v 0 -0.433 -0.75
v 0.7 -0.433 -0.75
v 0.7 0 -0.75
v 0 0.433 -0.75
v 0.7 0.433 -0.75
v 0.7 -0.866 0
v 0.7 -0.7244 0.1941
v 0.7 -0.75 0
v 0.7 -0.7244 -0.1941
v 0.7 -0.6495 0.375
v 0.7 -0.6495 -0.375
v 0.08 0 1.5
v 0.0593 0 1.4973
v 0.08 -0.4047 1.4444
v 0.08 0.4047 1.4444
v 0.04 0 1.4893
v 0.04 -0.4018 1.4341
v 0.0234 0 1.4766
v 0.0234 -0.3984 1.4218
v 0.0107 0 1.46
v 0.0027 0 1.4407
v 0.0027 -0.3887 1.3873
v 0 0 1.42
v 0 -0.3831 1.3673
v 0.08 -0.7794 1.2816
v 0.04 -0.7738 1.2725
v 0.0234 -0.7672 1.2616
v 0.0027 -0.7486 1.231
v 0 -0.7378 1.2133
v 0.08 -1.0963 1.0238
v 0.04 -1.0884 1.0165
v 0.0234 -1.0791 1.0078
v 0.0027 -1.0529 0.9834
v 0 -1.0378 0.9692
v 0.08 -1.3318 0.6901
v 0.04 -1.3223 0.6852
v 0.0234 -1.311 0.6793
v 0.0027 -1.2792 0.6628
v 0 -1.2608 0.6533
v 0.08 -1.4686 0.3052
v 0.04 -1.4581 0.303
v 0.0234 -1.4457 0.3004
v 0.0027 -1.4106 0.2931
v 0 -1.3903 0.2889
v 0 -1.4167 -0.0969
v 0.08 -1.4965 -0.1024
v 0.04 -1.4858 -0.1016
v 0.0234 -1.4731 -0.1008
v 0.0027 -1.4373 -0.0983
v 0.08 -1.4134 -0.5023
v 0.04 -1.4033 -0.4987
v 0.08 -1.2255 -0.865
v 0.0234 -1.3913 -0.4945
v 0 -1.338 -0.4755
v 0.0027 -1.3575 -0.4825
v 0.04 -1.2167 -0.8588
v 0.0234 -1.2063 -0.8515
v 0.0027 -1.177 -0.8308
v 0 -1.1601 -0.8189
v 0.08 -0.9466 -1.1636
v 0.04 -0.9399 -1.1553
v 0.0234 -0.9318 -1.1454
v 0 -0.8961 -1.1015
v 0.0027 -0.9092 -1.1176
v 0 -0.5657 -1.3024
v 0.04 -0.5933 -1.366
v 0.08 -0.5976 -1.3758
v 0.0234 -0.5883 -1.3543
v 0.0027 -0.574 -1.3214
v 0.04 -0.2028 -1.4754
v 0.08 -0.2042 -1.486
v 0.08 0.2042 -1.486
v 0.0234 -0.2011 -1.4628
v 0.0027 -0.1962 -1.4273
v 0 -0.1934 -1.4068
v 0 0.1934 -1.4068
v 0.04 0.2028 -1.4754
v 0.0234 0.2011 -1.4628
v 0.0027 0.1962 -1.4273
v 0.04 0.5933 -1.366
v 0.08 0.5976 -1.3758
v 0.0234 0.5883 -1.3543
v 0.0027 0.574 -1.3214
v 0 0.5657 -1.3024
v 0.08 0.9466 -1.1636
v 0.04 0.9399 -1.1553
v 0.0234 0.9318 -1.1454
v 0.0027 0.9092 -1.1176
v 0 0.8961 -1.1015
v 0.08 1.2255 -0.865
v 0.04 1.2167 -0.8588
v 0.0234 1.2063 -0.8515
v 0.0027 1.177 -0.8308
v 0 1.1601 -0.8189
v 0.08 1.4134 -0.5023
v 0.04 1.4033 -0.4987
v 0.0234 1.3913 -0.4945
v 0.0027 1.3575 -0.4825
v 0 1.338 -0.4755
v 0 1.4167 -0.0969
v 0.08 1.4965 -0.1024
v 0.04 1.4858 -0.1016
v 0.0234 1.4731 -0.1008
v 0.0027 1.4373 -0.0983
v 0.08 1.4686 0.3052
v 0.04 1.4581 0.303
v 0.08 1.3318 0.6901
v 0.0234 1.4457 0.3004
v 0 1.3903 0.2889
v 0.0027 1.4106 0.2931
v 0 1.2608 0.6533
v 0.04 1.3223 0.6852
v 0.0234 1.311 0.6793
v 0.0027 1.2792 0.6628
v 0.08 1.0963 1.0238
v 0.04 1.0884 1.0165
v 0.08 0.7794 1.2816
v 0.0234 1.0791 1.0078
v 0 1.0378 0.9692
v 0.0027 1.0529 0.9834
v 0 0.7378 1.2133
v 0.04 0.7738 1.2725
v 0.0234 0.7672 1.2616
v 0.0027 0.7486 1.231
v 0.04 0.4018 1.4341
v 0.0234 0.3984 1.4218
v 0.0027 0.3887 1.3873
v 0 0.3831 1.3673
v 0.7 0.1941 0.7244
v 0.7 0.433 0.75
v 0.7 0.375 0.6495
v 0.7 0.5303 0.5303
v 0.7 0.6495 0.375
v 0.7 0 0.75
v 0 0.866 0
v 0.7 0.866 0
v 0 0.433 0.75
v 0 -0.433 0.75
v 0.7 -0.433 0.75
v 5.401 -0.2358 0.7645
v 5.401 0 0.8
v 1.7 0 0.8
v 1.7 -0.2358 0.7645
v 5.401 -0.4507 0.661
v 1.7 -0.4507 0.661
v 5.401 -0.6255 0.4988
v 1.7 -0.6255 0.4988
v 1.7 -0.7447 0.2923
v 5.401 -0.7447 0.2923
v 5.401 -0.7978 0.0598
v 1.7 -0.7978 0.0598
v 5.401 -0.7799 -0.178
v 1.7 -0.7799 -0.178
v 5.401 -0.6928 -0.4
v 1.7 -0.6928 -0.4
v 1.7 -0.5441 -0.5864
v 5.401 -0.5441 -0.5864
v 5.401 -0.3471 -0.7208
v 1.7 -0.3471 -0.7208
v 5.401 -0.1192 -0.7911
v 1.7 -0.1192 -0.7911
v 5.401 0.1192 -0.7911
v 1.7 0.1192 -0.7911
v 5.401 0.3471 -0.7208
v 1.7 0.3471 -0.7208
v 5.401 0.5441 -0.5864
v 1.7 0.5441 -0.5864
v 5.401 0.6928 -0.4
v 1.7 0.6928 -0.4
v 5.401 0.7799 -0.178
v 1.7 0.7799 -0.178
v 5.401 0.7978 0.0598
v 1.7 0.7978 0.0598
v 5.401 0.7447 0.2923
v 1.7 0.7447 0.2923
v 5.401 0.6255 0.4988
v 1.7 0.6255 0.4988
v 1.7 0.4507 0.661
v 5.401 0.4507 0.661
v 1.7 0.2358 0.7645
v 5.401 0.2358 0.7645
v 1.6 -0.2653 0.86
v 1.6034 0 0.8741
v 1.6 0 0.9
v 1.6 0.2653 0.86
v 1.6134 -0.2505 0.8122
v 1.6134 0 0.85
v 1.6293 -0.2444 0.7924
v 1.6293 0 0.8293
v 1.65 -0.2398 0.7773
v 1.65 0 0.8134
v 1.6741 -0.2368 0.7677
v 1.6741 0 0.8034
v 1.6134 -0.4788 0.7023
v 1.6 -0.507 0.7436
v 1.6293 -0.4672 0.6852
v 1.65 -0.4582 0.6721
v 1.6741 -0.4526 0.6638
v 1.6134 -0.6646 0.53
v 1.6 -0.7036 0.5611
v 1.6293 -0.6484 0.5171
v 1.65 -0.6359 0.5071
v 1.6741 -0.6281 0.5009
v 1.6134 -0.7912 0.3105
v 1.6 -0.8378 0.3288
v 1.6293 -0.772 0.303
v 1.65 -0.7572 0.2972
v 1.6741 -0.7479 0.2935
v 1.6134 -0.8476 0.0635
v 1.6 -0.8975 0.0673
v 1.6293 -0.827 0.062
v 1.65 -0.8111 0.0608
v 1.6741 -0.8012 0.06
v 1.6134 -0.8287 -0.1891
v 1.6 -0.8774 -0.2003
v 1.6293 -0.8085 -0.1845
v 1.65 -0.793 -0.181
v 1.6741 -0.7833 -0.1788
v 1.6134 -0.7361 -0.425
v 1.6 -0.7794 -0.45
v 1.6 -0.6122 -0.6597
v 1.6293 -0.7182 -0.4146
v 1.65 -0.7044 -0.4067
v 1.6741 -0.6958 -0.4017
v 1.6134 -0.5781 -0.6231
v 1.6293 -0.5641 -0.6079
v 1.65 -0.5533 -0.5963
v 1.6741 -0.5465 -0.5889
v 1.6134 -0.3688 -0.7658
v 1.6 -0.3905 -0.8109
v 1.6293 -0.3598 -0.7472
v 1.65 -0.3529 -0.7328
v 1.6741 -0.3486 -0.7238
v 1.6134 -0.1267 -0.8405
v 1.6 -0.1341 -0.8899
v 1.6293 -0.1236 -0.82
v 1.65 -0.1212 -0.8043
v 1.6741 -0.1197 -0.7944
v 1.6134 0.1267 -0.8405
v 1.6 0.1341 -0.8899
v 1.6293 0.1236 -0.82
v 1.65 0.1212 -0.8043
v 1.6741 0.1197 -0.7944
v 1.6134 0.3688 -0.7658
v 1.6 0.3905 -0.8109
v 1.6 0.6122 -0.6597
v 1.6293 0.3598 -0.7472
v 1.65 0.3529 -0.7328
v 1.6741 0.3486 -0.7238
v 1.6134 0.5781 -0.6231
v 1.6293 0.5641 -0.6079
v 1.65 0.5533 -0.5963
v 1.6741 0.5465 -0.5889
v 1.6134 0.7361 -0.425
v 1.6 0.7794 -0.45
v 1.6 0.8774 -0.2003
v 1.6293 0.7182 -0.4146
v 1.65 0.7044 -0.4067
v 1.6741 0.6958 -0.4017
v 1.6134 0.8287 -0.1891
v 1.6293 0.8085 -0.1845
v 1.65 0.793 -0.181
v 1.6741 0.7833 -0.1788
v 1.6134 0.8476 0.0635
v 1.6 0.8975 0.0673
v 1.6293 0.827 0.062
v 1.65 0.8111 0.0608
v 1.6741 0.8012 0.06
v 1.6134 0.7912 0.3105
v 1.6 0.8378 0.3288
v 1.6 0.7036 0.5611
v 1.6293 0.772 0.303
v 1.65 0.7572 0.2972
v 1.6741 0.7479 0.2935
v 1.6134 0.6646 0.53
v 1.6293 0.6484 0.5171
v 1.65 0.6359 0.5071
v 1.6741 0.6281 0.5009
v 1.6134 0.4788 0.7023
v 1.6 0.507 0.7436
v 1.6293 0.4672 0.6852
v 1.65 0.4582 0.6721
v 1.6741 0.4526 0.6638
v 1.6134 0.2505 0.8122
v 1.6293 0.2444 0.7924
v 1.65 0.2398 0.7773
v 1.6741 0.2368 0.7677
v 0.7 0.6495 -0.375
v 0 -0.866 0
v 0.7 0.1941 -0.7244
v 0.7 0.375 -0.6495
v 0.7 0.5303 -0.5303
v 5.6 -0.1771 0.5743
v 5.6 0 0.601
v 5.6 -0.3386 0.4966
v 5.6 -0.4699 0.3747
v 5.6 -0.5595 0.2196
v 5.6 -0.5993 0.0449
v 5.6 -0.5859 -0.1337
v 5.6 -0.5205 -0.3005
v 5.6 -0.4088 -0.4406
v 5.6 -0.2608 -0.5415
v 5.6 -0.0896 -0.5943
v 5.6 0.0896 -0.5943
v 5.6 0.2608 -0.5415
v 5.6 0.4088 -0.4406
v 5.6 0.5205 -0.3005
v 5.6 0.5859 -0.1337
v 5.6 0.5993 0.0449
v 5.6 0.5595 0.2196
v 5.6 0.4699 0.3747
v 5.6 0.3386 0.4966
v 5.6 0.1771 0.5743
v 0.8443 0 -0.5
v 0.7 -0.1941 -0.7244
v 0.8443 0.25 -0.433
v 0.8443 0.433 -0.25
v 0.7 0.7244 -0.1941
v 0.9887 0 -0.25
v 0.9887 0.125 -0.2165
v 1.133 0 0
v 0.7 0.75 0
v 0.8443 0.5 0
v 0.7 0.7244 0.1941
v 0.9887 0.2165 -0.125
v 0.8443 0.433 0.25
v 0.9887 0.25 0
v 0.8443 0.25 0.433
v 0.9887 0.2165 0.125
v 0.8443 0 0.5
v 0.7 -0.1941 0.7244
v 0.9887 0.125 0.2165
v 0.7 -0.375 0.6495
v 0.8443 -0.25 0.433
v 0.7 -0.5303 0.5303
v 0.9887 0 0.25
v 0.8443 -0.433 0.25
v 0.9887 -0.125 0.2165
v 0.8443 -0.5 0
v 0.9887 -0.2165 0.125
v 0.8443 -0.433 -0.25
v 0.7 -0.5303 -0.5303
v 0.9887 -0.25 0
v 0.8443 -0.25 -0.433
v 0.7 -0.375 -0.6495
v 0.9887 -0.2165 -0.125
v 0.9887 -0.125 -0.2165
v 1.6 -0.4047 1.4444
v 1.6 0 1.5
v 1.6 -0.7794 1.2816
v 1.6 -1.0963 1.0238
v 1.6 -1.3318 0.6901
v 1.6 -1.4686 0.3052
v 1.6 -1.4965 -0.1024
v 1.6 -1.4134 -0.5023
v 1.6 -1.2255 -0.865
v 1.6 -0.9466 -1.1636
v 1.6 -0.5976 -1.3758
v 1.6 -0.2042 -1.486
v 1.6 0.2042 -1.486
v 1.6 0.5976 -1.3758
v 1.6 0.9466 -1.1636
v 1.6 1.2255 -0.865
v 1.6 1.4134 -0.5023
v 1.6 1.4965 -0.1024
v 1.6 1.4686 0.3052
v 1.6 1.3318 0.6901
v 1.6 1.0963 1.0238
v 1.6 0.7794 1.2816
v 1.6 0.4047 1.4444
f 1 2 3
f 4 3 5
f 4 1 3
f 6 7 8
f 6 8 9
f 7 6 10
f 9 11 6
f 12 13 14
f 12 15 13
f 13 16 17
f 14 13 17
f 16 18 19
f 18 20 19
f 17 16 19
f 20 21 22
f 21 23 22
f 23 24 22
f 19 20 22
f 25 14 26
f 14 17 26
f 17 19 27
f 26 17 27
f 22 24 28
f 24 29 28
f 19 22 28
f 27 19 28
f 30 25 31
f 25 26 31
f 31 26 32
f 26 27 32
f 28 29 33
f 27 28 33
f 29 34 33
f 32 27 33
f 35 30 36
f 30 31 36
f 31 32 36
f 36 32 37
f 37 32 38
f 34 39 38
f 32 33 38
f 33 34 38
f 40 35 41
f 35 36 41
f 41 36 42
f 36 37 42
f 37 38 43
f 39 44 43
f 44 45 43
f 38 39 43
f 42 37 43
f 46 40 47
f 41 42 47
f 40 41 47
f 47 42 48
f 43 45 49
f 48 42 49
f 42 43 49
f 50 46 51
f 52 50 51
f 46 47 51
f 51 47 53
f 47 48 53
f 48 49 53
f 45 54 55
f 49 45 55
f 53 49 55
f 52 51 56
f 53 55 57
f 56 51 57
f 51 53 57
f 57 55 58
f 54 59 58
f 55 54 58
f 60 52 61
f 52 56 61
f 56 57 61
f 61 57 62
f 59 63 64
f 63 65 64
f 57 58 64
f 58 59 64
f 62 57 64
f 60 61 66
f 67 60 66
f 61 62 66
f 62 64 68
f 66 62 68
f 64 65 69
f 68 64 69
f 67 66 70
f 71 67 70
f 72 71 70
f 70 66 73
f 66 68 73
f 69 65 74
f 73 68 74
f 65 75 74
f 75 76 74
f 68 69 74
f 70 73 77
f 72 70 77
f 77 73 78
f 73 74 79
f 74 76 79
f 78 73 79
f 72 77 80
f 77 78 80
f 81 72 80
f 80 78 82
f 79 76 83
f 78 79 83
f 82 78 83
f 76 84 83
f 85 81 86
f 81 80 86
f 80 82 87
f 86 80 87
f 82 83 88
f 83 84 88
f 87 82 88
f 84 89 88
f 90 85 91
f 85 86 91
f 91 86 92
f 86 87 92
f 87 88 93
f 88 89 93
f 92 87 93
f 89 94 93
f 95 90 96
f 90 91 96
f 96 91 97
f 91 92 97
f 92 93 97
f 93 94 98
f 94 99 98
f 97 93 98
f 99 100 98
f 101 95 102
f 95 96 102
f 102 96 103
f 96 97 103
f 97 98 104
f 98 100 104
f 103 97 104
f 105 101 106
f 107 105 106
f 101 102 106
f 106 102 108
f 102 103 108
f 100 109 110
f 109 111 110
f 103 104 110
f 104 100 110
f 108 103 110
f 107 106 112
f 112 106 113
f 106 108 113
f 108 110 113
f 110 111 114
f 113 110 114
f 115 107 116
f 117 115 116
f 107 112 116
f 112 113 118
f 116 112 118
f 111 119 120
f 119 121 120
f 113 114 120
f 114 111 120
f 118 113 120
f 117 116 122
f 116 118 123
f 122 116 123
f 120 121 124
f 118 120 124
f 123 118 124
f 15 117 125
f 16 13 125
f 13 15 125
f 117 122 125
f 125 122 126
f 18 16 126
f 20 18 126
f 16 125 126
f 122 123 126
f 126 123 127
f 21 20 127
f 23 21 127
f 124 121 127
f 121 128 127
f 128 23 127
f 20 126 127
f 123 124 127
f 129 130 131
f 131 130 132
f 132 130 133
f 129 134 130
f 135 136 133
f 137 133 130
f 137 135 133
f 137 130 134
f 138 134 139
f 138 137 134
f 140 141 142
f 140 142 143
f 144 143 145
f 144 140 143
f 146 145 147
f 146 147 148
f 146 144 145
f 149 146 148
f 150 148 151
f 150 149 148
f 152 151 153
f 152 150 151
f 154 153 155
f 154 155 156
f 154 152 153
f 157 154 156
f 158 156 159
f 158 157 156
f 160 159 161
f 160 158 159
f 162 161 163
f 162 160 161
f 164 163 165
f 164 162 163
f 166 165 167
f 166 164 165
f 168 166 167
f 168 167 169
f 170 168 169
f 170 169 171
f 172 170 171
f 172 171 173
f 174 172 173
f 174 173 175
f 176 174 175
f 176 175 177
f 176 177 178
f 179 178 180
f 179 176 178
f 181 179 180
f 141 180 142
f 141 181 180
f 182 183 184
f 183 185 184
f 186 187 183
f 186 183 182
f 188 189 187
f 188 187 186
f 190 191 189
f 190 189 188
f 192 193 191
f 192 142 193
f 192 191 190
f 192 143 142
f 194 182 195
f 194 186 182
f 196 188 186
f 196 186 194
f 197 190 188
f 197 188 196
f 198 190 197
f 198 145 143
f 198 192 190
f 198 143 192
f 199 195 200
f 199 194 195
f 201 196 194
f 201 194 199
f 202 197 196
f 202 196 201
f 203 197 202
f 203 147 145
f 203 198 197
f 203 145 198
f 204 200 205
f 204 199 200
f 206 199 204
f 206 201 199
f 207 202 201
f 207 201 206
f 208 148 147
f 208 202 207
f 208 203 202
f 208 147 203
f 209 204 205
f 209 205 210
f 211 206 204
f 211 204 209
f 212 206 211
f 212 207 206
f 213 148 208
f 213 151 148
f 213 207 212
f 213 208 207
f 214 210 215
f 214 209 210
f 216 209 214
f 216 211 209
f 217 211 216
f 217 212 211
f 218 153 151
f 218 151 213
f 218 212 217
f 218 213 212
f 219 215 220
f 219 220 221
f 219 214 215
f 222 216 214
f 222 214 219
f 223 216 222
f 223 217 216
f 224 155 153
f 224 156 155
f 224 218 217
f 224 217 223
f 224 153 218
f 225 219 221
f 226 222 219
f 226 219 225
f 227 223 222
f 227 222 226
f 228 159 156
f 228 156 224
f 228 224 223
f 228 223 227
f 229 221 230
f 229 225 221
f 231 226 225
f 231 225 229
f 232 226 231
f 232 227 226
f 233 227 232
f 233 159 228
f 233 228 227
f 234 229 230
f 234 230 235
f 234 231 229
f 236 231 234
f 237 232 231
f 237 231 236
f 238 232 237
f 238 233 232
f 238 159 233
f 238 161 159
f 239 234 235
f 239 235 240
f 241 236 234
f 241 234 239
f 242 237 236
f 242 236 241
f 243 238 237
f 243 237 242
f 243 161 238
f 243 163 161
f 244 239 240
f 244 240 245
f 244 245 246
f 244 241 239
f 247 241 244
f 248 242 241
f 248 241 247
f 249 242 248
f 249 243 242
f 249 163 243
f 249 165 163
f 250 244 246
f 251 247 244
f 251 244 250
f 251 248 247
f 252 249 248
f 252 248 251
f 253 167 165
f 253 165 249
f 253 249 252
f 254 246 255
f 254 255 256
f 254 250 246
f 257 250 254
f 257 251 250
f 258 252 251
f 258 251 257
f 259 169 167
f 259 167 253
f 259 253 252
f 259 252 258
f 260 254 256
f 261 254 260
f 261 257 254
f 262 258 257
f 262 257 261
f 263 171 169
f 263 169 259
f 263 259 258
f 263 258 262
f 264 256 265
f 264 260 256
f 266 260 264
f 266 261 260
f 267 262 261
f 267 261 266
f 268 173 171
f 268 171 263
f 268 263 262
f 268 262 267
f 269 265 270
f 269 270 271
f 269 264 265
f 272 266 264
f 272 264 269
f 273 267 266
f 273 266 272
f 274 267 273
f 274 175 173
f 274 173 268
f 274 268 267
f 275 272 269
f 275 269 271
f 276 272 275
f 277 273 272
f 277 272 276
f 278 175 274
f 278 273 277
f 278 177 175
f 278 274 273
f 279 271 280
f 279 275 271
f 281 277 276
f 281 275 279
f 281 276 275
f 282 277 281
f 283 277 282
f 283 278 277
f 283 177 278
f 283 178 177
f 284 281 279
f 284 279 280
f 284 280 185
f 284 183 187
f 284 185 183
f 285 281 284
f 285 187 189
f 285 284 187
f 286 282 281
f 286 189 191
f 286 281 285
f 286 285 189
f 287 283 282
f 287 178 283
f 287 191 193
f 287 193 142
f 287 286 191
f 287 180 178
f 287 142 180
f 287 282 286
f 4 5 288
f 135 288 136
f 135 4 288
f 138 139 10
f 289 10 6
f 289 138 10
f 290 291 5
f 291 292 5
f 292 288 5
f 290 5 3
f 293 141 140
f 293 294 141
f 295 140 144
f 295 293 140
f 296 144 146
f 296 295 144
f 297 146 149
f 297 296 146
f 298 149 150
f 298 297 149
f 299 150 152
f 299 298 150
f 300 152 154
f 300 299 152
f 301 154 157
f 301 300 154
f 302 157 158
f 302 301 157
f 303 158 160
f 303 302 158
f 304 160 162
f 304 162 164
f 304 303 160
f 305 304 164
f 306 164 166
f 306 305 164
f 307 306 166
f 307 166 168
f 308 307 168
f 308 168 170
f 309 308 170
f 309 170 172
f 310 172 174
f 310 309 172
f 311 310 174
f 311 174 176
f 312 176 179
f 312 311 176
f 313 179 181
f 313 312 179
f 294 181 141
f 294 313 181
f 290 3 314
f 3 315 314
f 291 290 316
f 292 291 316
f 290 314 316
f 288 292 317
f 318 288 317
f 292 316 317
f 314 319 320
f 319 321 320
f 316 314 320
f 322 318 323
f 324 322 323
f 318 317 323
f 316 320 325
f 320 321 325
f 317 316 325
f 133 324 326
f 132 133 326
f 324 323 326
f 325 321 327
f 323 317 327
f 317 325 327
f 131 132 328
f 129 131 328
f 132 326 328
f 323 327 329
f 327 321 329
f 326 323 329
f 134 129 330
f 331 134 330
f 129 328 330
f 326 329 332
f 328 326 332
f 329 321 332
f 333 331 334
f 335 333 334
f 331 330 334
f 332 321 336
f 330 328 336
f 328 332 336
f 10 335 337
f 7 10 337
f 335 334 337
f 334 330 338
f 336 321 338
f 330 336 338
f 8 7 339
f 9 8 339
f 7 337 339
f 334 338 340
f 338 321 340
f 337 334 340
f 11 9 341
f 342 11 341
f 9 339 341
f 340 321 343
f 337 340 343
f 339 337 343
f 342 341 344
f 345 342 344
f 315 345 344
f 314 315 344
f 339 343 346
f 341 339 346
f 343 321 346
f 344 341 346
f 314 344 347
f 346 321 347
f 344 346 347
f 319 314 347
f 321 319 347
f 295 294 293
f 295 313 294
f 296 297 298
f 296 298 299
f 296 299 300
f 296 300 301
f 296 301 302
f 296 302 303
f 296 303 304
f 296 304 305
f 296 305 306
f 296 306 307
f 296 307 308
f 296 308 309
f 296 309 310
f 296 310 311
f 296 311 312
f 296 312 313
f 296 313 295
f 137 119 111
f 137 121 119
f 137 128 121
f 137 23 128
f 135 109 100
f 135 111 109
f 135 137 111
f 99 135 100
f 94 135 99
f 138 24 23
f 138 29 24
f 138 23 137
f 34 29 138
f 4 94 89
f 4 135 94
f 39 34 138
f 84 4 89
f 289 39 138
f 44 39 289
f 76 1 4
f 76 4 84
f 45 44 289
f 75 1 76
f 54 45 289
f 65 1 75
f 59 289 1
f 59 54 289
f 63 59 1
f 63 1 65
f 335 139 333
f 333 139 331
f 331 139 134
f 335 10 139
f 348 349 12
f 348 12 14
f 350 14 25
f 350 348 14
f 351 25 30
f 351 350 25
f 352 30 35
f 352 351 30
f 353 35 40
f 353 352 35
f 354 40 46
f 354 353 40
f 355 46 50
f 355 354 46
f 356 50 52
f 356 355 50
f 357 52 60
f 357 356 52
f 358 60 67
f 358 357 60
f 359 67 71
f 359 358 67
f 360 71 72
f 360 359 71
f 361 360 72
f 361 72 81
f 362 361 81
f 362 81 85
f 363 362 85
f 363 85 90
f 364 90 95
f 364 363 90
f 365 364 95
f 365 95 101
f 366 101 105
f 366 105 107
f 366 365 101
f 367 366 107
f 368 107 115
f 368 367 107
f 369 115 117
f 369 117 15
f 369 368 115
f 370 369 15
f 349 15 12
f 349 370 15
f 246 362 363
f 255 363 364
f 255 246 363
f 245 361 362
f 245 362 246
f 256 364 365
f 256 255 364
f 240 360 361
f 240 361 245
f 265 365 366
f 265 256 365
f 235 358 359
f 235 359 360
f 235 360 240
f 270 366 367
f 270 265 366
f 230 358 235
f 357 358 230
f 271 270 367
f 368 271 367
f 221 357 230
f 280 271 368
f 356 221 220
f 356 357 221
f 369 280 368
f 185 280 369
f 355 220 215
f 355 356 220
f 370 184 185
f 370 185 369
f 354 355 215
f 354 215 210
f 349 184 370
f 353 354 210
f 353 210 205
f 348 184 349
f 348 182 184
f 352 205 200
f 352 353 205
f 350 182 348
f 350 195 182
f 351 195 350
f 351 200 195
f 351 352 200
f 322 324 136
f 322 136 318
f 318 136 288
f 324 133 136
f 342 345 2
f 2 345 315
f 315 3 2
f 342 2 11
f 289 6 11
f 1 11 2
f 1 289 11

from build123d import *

# Parameters (mm, degrees)
FILLET1_R   = 0.1
FILLET2_R   = 0.08
HEX_2_DEPTH = 0.7


with BuildPart() as part:
    # BodySke → BaseBody (revolve)
    with BuildSketch(Plane.XY, mode=Mode.PRIVATE) as basebody_sk:
        Polygon((0, 0), (0, 1.5), (1.6, 1.5), (1.6, 0.8), (5.401, 0.8), (5.6, 0.601), (5.6, 0), align=None)
    revolve(basebody_sk.sketch.rotate(Axis((0, 0, 0), (1, 0, 0)), 90), axis=Axis((0, 0, 0), (1, 0, 0)))

    # Fillet1
    fillet1_edges = [part.edges().sort_by_distance(p)[0] for p in [
        (1.6, 0, -0.8),
    ]]
    fillet(fillet1_edges, radius=FILLET1_R)

    # Fillet2
    fillet2_edges = [part.edges().sort_by_distance(p)[0] for p in [
        (0, 0, -1.5),
    ]]
    fillet(fillet2_edges, radius=FILLET2_R)

    # HexSke → Hex 2 (cut)
    with BuildSketch(Plane(origin=(0, 0, 0), x_dir=(0, 0, -1), z_dir=(1, 0, 0))):
        Polygon((0, 0.866025404), (-0.75, 0.433012702), (-0.75, -0.433012702), (0, -0.866025404), (0.75, -0.433012702), (0.75, 0.433012702), align=None)
    extrude(amount=HEX_2_DEPTH, mode=Mode.SUBTRACT)

    # Hex-PreBroachSke → Hex-PreBroach (revolve, cut)
    with BuildSketch(Plane.XY, mode=Mode.PRIVATE) as hex_prebroach_sk:
        Polygon((0, 0), (0, 0.75), (0.7, 0.75), (1.133012702, 0), align=None)
    revolve(hex_prebroach_sk.sketch.rotate(Axis((0, 0, 0), (1, 0, 0)), 270), axis=Axis((0, 0, 0), (1, 0, 0)), mode=Mode.SUBTRACT)


solid = part.part
